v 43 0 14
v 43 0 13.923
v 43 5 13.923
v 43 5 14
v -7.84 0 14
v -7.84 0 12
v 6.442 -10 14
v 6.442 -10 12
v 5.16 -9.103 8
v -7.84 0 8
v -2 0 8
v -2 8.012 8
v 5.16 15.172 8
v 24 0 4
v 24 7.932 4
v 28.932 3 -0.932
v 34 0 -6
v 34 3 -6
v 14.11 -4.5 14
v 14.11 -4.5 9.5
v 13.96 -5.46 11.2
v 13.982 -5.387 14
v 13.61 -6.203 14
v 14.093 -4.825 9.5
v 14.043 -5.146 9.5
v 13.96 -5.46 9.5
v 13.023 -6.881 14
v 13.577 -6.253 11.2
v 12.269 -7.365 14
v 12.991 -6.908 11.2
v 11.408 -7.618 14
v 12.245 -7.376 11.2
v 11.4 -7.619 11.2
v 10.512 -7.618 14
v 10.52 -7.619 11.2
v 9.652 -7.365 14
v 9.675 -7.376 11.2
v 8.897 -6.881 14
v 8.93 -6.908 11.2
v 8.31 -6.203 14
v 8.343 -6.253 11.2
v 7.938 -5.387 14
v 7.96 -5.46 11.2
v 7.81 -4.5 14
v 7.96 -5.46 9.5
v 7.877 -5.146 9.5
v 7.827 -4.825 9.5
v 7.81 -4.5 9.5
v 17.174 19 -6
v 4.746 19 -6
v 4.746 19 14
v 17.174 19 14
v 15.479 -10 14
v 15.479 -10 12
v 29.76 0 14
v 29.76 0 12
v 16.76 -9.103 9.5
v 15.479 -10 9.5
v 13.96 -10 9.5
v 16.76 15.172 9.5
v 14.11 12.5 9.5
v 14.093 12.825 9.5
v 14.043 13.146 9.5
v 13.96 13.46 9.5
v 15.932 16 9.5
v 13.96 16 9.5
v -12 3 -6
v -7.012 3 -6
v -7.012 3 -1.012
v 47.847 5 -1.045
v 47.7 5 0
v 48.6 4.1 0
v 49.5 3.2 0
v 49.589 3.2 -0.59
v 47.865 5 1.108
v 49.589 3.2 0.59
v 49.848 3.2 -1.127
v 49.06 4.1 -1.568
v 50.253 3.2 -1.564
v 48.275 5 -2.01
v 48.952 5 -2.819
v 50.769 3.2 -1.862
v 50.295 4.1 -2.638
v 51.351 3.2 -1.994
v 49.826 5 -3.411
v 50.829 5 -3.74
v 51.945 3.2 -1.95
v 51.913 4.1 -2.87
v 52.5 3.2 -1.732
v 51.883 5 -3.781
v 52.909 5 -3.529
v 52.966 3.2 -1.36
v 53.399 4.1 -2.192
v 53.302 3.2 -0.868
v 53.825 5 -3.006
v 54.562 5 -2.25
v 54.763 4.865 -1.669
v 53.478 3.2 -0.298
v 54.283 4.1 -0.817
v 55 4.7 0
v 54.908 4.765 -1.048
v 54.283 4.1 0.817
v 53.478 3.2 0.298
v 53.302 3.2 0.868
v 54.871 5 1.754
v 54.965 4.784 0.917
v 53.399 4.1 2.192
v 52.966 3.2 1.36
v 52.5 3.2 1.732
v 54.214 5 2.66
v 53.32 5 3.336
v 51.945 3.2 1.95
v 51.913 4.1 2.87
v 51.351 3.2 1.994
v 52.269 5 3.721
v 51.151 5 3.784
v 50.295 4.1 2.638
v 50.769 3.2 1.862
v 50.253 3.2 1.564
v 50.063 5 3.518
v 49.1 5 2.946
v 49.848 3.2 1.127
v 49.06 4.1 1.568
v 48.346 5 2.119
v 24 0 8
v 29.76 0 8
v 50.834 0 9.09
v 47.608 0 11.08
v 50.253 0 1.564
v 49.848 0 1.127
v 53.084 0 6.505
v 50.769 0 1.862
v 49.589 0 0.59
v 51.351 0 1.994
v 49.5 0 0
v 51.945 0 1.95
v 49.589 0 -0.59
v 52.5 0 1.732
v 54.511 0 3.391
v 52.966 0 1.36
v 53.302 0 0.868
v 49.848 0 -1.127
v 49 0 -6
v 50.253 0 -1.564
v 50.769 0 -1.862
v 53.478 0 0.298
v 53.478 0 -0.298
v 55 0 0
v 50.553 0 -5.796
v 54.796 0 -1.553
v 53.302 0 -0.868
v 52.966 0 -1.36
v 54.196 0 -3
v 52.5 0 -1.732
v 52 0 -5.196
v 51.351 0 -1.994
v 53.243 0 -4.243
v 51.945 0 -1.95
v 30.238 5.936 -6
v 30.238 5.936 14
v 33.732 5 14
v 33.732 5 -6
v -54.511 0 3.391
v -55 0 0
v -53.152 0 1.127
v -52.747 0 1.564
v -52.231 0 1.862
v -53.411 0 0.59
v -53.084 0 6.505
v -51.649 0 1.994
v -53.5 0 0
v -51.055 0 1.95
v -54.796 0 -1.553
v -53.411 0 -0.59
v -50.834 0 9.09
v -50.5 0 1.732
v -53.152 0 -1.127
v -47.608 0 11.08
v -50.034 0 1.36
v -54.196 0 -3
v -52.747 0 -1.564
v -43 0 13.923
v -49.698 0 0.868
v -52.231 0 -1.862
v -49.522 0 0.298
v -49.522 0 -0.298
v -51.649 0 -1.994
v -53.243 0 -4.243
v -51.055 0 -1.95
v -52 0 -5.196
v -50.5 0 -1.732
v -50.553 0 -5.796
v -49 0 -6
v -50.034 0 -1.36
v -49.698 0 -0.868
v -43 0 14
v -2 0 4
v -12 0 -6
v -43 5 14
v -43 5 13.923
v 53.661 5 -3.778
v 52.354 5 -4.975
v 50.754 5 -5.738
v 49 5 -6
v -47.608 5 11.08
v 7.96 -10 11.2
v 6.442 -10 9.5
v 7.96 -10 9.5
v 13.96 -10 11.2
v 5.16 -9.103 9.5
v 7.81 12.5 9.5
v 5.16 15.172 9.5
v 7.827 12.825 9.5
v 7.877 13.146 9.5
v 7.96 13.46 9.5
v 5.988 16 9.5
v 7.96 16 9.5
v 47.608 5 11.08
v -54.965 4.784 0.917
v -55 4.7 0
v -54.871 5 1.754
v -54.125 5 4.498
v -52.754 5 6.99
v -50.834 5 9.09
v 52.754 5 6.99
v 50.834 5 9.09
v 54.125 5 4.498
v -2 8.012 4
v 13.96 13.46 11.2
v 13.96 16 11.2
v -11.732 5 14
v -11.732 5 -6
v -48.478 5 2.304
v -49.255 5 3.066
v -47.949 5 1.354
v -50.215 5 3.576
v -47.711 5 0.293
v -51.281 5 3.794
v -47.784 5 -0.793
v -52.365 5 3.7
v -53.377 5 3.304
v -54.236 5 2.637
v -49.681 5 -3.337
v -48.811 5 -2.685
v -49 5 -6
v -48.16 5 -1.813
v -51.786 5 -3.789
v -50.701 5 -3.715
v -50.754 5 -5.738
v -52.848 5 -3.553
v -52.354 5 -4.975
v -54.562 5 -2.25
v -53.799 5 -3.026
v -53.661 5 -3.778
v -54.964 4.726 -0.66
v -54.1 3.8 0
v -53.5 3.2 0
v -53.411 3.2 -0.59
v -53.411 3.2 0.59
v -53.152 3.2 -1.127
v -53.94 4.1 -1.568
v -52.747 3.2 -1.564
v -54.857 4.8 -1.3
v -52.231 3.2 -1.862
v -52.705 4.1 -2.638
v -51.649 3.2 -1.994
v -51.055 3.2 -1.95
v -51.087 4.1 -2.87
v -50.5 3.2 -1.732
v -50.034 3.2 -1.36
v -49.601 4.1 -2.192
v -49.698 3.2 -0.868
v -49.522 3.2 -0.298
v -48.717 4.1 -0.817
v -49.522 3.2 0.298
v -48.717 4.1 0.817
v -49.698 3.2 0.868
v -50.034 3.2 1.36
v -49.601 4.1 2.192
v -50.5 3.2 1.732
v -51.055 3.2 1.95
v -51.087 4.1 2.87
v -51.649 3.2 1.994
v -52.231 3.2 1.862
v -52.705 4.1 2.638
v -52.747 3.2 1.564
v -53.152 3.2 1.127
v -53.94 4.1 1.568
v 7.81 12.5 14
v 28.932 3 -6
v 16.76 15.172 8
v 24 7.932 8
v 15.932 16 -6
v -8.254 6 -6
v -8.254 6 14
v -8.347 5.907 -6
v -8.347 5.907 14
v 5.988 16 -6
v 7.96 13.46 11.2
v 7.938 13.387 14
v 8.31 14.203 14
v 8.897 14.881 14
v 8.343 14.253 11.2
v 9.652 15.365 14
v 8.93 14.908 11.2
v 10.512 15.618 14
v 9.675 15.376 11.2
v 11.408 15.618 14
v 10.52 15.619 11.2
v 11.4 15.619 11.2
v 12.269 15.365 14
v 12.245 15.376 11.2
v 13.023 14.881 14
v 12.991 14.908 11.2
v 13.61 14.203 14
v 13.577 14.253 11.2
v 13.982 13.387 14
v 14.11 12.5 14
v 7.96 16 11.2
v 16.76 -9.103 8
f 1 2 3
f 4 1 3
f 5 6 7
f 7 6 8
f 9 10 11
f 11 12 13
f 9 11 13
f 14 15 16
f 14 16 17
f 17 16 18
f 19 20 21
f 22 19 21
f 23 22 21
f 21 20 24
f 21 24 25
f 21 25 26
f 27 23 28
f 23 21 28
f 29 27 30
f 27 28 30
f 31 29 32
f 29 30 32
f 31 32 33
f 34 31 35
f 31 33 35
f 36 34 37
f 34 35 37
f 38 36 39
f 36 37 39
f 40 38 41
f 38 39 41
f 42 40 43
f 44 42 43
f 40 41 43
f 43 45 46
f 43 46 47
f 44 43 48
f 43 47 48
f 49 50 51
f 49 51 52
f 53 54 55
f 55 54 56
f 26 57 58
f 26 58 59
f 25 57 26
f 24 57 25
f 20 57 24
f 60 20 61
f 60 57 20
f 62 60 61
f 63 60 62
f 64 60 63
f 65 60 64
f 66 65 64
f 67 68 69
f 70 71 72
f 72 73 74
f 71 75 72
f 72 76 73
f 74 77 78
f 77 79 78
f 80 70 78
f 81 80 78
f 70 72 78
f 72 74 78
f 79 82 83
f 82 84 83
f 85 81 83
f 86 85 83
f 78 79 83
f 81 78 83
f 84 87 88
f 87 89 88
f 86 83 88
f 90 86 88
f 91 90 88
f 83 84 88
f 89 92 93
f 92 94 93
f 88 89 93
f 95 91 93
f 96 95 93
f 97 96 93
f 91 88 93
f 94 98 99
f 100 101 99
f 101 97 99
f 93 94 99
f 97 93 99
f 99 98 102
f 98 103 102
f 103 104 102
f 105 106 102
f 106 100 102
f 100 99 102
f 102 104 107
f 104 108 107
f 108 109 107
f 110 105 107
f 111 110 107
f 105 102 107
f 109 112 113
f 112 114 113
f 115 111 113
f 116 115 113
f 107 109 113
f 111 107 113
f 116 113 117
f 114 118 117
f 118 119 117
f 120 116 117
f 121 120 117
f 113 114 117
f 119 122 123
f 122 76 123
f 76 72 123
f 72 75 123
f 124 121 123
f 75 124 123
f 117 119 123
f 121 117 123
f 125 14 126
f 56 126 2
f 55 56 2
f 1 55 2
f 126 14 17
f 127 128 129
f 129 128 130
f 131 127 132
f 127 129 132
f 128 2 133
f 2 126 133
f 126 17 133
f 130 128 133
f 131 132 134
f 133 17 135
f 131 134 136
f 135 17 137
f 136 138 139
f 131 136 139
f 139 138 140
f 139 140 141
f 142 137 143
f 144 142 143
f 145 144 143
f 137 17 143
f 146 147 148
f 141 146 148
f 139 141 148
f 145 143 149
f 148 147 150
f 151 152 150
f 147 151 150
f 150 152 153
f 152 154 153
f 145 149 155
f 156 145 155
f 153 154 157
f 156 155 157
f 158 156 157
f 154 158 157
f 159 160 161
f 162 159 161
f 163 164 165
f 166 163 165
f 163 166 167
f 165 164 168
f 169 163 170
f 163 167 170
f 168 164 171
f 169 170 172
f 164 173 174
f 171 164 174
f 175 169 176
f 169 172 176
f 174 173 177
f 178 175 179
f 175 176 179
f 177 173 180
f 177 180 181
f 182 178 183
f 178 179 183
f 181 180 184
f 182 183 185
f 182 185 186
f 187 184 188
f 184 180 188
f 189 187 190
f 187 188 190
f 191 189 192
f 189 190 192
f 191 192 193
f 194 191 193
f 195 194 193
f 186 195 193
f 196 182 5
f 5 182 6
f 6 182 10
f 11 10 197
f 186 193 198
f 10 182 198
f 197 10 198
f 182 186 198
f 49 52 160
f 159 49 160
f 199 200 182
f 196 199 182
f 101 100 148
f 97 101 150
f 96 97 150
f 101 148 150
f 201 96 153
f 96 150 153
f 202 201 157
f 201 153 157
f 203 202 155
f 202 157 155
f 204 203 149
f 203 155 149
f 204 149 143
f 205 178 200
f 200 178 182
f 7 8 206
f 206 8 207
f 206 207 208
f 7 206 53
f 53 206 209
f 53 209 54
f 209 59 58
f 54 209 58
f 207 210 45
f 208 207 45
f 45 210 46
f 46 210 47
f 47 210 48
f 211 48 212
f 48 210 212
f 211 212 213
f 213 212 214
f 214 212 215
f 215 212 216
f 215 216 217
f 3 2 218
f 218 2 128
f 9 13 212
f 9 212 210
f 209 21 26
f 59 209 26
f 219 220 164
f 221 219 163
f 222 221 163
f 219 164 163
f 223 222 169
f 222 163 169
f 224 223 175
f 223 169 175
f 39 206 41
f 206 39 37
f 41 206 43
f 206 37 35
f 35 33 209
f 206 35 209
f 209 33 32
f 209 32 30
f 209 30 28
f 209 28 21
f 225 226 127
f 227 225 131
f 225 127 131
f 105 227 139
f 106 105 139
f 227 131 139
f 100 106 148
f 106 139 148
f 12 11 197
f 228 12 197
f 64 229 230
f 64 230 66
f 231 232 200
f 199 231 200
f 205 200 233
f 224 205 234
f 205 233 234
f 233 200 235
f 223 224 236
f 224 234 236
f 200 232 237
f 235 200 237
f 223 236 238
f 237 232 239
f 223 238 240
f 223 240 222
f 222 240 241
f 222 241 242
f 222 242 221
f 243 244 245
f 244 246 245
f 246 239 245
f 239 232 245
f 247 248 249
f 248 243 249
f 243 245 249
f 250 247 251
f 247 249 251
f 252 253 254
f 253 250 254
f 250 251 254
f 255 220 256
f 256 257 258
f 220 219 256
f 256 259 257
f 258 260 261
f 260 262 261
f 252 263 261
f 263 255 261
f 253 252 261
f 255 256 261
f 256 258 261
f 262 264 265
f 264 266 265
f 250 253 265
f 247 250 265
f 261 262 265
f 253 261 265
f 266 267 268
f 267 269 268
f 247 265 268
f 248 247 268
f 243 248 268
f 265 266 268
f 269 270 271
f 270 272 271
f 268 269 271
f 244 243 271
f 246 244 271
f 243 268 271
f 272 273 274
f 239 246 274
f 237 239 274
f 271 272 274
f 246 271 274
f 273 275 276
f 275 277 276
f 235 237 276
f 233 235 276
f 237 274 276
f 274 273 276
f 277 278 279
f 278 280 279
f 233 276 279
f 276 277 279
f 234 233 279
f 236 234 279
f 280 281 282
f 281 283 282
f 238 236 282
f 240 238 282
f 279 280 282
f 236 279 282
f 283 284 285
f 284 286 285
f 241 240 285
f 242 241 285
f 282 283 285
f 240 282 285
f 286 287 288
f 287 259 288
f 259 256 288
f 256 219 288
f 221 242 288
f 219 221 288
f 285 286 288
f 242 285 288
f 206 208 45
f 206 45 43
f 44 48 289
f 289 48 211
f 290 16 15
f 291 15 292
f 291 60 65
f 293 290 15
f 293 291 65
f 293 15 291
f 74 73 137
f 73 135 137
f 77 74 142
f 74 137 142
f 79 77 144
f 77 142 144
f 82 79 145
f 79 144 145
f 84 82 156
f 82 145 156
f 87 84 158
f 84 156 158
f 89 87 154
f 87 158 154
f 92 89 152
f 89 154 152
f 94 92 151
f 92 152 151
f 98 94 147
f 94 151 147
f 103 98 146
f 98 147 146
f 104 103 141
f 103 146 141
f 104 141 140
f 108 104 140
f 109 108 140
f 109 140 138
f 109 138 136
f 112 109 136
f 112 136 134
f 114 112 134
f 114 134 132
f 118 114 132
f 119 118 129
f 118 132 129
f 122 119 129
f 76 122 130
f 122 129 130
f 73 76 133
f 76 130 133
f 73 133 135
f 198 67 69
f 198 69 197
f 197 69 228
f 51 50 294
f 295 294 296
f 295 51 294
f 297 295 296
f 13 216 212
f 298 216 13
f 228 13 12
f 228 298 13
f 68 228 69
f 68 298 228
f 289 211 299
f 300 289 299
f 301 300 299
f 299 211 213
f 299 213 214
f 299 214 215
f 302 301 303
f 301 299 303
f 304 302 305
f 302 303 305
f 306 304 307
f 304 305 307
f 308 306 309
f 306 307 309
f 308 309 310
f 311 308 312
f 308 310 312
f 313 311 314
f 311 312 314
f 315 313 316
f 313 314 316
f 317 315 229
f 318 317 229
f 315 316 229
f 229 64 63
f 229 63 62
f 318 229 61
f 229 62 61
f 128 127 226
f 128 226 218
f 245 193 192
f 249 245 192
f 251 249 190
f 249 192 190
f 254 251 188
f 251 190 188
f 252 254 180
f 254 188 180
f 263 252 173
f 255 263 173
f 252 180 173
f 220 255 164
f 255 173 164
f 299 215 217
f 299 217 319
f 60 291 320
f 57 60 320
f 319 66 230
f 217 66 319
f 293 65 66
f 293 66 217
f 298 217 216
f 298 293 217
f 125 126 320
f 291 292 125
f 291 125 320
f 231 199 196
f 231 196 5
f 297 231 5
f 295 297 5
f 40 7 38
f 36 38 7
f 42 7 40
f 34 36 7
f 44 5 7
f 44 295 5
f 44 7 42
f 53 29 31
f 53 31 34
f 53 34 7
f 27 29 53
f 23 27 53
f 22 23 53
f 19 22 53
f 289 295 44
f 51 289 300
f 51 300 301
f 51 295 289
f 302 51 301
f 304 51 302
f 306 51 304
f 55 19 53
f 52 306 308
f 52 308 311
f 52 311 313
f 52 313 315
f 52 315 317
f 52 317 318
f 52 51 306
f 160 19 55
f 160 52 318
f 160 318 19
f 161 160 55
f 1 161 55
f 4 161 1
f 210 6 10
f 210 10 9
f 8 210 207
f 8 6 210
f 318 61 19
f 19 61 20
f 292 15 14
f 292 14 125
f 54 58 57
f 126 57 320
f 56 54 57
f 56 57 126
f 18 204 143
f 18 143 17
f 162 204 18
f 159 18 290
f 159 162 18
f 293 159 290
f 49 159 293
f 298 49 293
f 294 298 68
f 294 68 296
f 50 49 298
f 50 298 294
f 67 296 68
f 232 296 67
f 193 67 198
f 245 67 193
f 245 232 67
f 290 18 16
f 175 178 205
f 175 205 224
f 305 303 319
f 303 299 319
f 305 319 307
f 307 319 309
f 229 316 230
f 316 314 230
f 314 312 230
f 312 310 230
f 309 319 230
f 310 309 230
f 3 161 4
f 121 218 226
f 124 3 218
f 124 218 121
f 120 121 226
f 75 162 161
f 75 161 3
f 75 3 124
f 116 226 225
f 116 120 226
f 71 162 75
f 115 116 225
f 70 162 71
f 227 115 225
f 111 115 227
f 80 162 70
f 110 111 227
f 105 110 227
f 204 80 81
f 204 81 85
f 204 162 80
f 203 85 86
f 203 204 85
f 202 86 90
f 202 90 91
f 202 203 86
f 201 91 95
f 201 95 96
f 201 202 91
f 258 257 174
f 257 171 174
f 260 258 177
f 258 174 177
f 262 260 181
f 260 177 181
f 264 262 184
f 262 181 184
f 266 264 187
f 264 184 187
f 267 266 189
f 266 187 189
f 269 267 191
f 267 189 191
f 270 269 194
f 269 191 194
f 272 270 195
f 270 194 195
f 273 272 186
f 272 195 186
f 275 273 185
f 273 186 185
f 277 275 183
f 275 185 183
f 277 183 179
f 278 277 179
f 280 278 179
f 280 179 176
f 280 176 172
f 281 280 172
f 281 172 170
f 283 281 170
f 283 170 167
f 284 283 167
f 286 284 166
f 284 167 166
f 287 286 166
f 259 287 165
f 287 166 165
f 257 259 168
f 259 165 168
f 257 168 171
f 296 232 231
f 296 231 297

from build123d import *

# Parameters (mm, degrees)
BOSS_EXTRUDE1_DEPTH           = 3
CUT_EXTRUDE1_DEPTH            = 10
CUT_EXTRUDE3_START            = 8
SKETCH8_W                     = 6
SKETCH8_H                     = 3
CUT_EXTRUDE3_DEPTH            = 6
BOSS_EXTRUDE4_START           = 18
BOSS_EXTRUDE4_DEPTH           = 28
BOSS_EXTRUDE5_DEPTH           = 3
CUT_EXTRUDE4_DEPTH            = 3
CUT_EXTRUDE5_DEPTH            = 10
SKETCH18_R                    = 1.5
BOSS_EXTRUDE9_DEPTH           = 2
CHAMFER1_SIZE                 = 15
CHAMFER2_SIZE                 = 15
CHAMFER2_SIZE_2               = 10.503113073
CUT_EXTRUDE6_DEPTH            = 5
BOSS_EXTRUDE8_DEPTH           = 2
CHAMFER3_DEPTH                = 6
CHAMFER3_2_DEPTH              = 5
CSK_FOR_M4_SFHCS1_D           = 4
CSK_FOR_M4_SFHCS1_DEPTH       = 30.798278762
CSK_FOR_M4_SFHCS1_CSINK_D     = 7.6
CSK_FOR_M4_SFHCS1_CSINK_ANGLE = 90
CSK_FOR_M4_SFHCS1_TIP         = 1.201721238
CUT_EXTRUDE7_DEPTH            = 1.5
BOSS_EXTRUDE10_START          = -6
BOSS_EXTRUDE10_DEPTH          = 20
CHAMFER4_SIZE                 = 1.07179677
CHAMFER4_SIZE_2               = 4


with BuildPart() as part:
    # Sketch1 → Boss-Extrude1 (new body)
    with BuildSketch(Plane(origin=(0, 0, 0), x_dir=(1, 0, 0), z_dir=(0, 1, 0))):
        with BuildLine():
            ThreePointArc((-49, -6), (-53.242640687, -4.242640687), (-55, 0))
            ThreePointArc((-55, 0), (-51.485281374, -8.485281374), (-43, -12))
            Line((-43, -12), (43, -12))
            ThreePointArc((43, -12), (51.485281374, -8.485281374), (55, 0))
            ThreePointArc((55, 0), (53.242640687, -4.242640687), (49, -6))
            Line((49, -6), (-49, -6))
        make_face()
        with BuildLine():
            Line((-53, 0), (-55, 0))
            ThreePointArc((-55, 0), (-53.242640687, -4.242640687), (-49, -6))
            Line((-49, -6), (49, -6))
            ThreePointArc((49, -6), (53.242640687, -4.242640687), (55, 0))
            Line((55, 0), (53, 0))
            ThreePointArc((53, 0), (51.5, -1.5), (50, 0))
            Line((50, 0), (-50, 0))
            ThreePointArc((-50, 0), (-51.5, -1.5), (-53, 0))
        make_face()
        with BuildLine():
            Line((49, 6), (-49, 6))
            ThreePointArc((-49, 6), (-53.242640687, 4.242640687), (-55, 0))
            Line((-55, 0), (-53, 0))
            ThreePointArc((-53, 0), (-51.5, 1.5), (-50, 0))
            Line((-50, 0), (50, 0))
            ThreePointArc((50, 0), (51.5, 1.5), (53, 0))
            Line((53, 0), (55, 0))
            ThreePointArc((55, 0), (53.242640687, 4.242640687), (49, 6))
        make_face()
    extrude(amount=BOSS_EXTRUDE1_DEPTH)

    # Sketch2 → Cut-Extrude1 (cut)
    with BuildSketch(Plane(origin=(0, 3, 0), x_dir=(1, 0, 0), z_dir=(0, 1, 0))):
        Polygon((22, -8), (36, 6), (-14, 6), (0, -8), align=None)
    extrude(amount=-CUT_EXTRUDE1_DEPTH, mode=Mode.SUBTRACT)

    # Sketch8 → Cut-Extrude3 (cut)
    with BuildSketch(Plane.XY.offset(CUT_EXTRUDE3_START)):
        with Locations((10.960071178, 1.5)):
            Rectangle(SKETCH8_W, SKETCH8_H)
    extrude(amount=CUT_EXTRUDE3_DEPTH, mode=Mode.SUBTRACT)


with BuildPart() as cut_extrude3_piece_1:
    # of the separate pieces the step leaves, piece 1, a body of its own (cut_extrude3_pieces)
    add(part.part.solids().sort_by_distance((-55, 0, 0))[0])

    # Sketch9 → Boss-Extrude4 (add)
    with BuildSketch(Plane(origin=(0, 0, 0), x_dir=(1, 0, 0), z_dir=(0, 1, 0)).offset(BOSS_EXTRUDE4_START)):
        Polygon((13.960071178, -11.2), (13.960071178, -8), (14.760071178, -8), (14.760071178, -12), (7.160071178, -12), (7.160071178, -8), (7.960071178, -8), (7.960071178, -11.2), align=None)
    extrude(amount=-BOSS_EXTRUDE4_DEPTH)


with BuildPart() as cut_extrude3_piece_2:
    # of the separate pieces the step leaves, piece 2, a body of its own (cut_extrude3_pieces)
    add(part.part.solids().sort_by_distance((13.960071178, 0, 12))[0])


with BuildPart() as cut_extrude3_piece_1_1:
    add(cut_extrude3_piece_1.part)

    # Combine1: union Cut-Extrude3 piece 2
    add(cut_extrude3_piece_2.part)

    # Sketch11 → Boss-Extrude5 (add)
    with BuildSketch(Plane(origin=(0, 3, 0), x_dir=(1, 0, 0), z_dir=(0, 1, 0))):
        Polygon((-14, 6), (-12, 6), (2, -8), (0, -8), align=None)
        Polygon((20, -8), (34, 6), (36, 6), (22, -8), align=None)
    extrude(amount=-BOSS_EXTRUDE5_DEPTH)

    # Sketch13 → Cut-Extrude4 (cut)
    with BuildSketch(Plane(origin=(0, 3, 0), x_dir=(1, 0, 0), z_dir=(0, 1, 0))):
        Polygon((2, -8), (-2, -8), (-2, -4), align=None)
        Polygon((24, -4), (24, -8), (20, -8), align=None)
    extrude(amount=-CUT_EXTRUDE4_DEPTH, mode=Mode.SUBTRACT)

    # Sketch15 → Cut-Extrude5 (cut)
    with BuildSketch(Plane.XY.offset(12)):
        with BuildLine():
            Line((14.110071178, 12.5), (14.110071178, -4.5))
            ThreePointArc((14.110071178, -4.5), (10.960071178, -7.65), (7.810071178, -4.5))
            Line((7.810071178, -4.5), (7.810071178, 12.5))
            ThreePointArc((7.810071178, 12.5), (10.960071178, 15.65), (14.110071178, 12.5))
        make_face()
    extrude(amount=-CUT_EXTRUDE5_DEPTH, mode=Mode.SUBTRACT)

    # Sketch18 → Boss-Extrude9 (add)
    # profile 1 of 2: a face of its own
    with BuildSketch(Plane(origin=(0, 3, 0), x_dir=(1, 0, 0), z_dir=(0, 1, 0))):
        with BuildLine():
            Line((7.160071178, -8), (-2, -8))
            Line((-2, -8), (-2, -4))
            Line((-2, -4), (-12, 6))
            Line((-12, 6), (-49, 6))
            ThreePointArc((-49, 6), (-53.242640687, 4.242640687), (-55, 0))
            ThreePointArc((-55, 0), (-51.485281374, -8.485281374), (-43, -12))
            Line((-43, -12), (7.160071178, -12))
            Line((7.160071178, -12), (7.160071178, -8))
        make_face()
        with Locations(Location((-51.5, 0, 0), (0, 0, 270))):
            Circle(SKETCH18_R, mode=Mode.SUBTRACT)
    # profile 2 of 2: a face of its own
    with BuildSketch(Plane(origin=(0, 3, 0), x_dir=(1, 0, 0), z_dir=(0, 1, 0))):
        with BuildLine():
            Line((24, -4), (24, -8))
            Line((24, -8), (14.760071178, -8))
            Line((14.760071178, -8), (14.760071178, -12))
            Line((14.760071178, -12), (43, -12))
            ThreePointArc((43, -12), (51.485281374, -8.485281374), (55, 0))
            ThreePointArc((55, 0), (53.242640687, 4.242640687), (49, 6))
            Line((49, 6), (34, 6))
            Line((34, 6), (24, -4))
        make_face()
        with Locations(Location((51.5, 0, 0), (0, 0, 270))):
            Circle(SKETCH18_R, mode=Mode.SUBTRACT)
    extrude(amount=BOSS_EXTRUDE9_DEPTH)

    # Chamfer1
    # the kernel refuses this chamfer: 15 mm, written as the material it adds along each edge
    with BuildSketch(Plane(origin=(14.760071178, 5, 8), x_dir=(0, 1, 0), z_dir=(0, 0, 1))) as chamfer1_piece_1_section:
        Polygon((CHAMFER1_SIZE, 0), (0, -CHAMFER1_SIZE), (0, 0), align=None)
    chamfer1_piece_1 = extrude(amount=4, mode=Mode.PRIVATE)
    chamfer1_piece_1 = split(chamfer1_piece_1, bisect_by=Plane(origin=(14.760071178, 18, 8), z_dir=(0, -1, 0)), keep=Keep.TOP, mode=Mode.PRIVATE)
    chamfer1_piece_1 = split(chamfer1_piece_1, bisect_by=Plane(origin=(17.380035589, 5, 10.619964411), z_dir=(-0.7071067811865474, 0, -0.7071067811865477)), keep=Keep.TOP, mode=Mode.PRIVATE)
    add(chamfer1_piece_1)
    with BuildSketch(Plane(origin=(14.760071178, 5, -30.575244819), x_dir=(0, 1, 0), z_dir=(0, 0, 1))) as chamfer1_piece_2_section:
        Polygon((CHAMFER1_SIZE, 0), (0, -CHAMFER1_SIZE), (0, 0), align=None)
    chamfer1_piece_2 = extrude(amount=42.575244819, mode=Mode.PRIVATE)
    chamfer1_piece_2 = split(chamfer1_piece_2, bisect_by=Plane(origin=(14.760071178, 5, 8), z_dir=(0, 0, -1)), keep=Keep.TOP, mode=Mode.PRIVATE)
    chamfer1_piece_2 = split(chamfer1_piece_2, bisect_by=Plane(origin=(36.667657999, 5, -8.667657999), z_dir=(0.7071067811865474, 0, 0.7071067811865477)), keep=Keep.TOP, mode=Mode.PRIVATE)
    chamfer1_piece_2 = split(chamfer1_piece_2, bisect_by=Plane(origin=(24, 5, -30.575244819), z_dir=(1, 0, 0)), keep=Keep.TOP, mode=Mode.PRIVATE)
    add(chamfer1_piece_2)
    with BuildSketch(Plane(origin=(14.760071178, 5, 8), x_dir=(0, 1, 0), z_dir=(0, 0, 1))) as chamfer1_piece_3_section:
        Polygon((CHAMFER1_SIZE, 0), (0, -CHAMFER1_SIZE), (0, 0), align=None)
    chamfer1_piece_3 = extrude(amount=4, mode=Mode.PRIVATE)
    chamfer1_piece_3 = split(chamfer1_piece_3, bisect_by=Plane(origin=(14.760071178, 18, 8), z_dir=(0, -1, 0)), keep=Keep.TOP, mode=Mode.PRIVATE)
    chamfer1_piece_3 = split(chamfer1_piece_3, bisect_by=Plane(origin=(17.380035589, 5, 10.619964411), z_dir=(0.7071067811865474, 0, 0.7071067811865477)), keep=Keep.TOP, mode=Mode.PRIVATE)
    chamfer1_piece_3 = split(chamfer1_piece_3, bisect_by=Plane(origin=(24, 5, 8), z_dir=(-1, 0, 0)), keep=Keep.TOP, mode=Mode.PRIVATE)
    add(chamfer1_piece_3)
    with BuildSketch(Plane(origin=(14.760071178, 5, 8), x_dir=(0, 1, 0), z_dir=(0, 0, 1))) as chamfer1_piece_4_section:
        Polygon((CHAMFER1_SIZE, 0), (0, -CHAMFER1_SIZE), (0, 0), align=None)
    chamfer1_piece_4 = extrude(amount=4, mode=Mode.PRIVATE)
    chamfer1_piece_4 = split(chamfer1_piece_4, bisect_by=Plane(origin=(24, 5, 8), z_dir=(1, 0, 0)), keep=Keep.TOP, mode=Mode.PRIVATE)
    add(chamfer1_piece_4)
    with BuildSketch(Plane(origin=(7.160071178, 5, 12), x_dir=(0, 1, 0), z_dir=(0, 0, -1))) as chamfer1_piece_5_section:
        Polygon((CHAMFER1_SIZE, 0), (0, -CHAMFER1_SIZE), (0, 0), align=None)
    chamfer1_piece_5 = extrude(amount=4, mode=Mode.PRIVATE)
    chamfer1_piece_5 = split(chamfer1_piece_5, bisect_by=Plane(origin=(6.580035589, 5, 12.580035589), z_dir=(-0.7071067811865489, 0, 0.7071067811865461)), keep=Keep.TOP, mode=Mode.PRIVATE)
    chamfer1_piece_5 = split(chamfer1_piece_5, bisect_by=Plane(origin=(-2, 5, 12), z_dir=(1, 0, 0)), keep=Keep.TOP, mode=Mode.PRIVATE)
    chamfer1_piece_5 = split(chamfer1_piece_5, bisect_by=Plane(origin=(7.160071178, 18, 12), z_dir=(0, -1, 0)), keep=Keep.TOP, mode=Mode.PRIVATE)
    add(chamfer1_piece_5)
    with BuildSketch(Plane(origin=(7.160071178, 5, 12), x_dir=(0, 1, 0), z_dir=(0, 0, -1))) as chamfer1_piece_6_section:
        Polygon((CHAMFER1_SIZE, 0), (0, -CHAMFER1_SIZE), (0, 0), align=None)
    chamfer1_piece_6 = extrude(amount=4, mode=Mode.PRIVATE)
    chamfer1_piece_6 = split(chamfer1_piece_6, bisect_by=Plane(origin=(-2, 5, 12), z_dir=(-1, 0, 0)), keep=Keep.TOP, mode=Mode.PRIVATE)
    add(chamfer1_piece_6)
    with BuildSketch(Plane(origin=(7.160071178, 5, 12), x_dir=(0, 1, 0), z_dir=(0, 0, -1))) as chamfer1_piece_7_section:
        Polygon((CHAMFER1_SIZE, 0), (0, -CHAMFER1_SIZE), (0, 0), align=None)
    chamfer1_piece_7 = extrude(amount=4, mode=Mode.PRIVATE)
    chamfer1_piece_7 = split(chamfer1_piece_7, bisect_by=Plane(origin=(6.580035589, 5, 12.580035589), z_dir=(0.7071067811865489, 0, -0.7071067811865461)), keep=Keep.TOP, mode=Mode.PRIVATE)
    chamfer1_piece_7 = split(chamfer1_piece_7, bisect_by=Plane(origin=(7.160071178, 18, 12), z_dir=(0, -1, 0)), keep=Keep.TOP, mode=Mode.PRIVATE)
    add(chamfer1_piece_7)
    with BuildSketch(Plane(origin=(7.160071178, 5, 12), x_dir=(0, 1, 0), z_dir=(0, 0, -1))) as chamfer1_piece_8_section:
        Polygon((CHAMFER1_SIZE, 0), (0, -CHAMFER1_SIZE), (0, 0), align=None)
    chamfer1_piece_8 = extrude(amount=42.575244819, mode=Mode.PRIVATE)
    chamfer1_piece_8 = split(chamfer1_piece_8, bisect_by=Plane(origin=(6.580035589, 5, 12.580035589), z_dir=(-0.7071067811865489, 0, 0.7071067811865461)), keep=Keep.TOP, mode=Mode.PRIVATE)
    chamfer1_piece_8 = split(chamfer1_piece_8, bisect_by=Plane(origin=(-2, 5, 12), z_dir=(-1, 0, 0)), keep=Keep.TOP, mode=Mode.PRIVATE)
    chamfer1_piece_8 = split(chamfer1_piece_8, bisect_by=Plane(origin=(7.160071178, 5, 8), z_dir=(0, 0, -1)), keep=Keep.TOP, mode=Mode.PRIVATE)
    add(chamfer1_piece_8)

    # Chamfer2
    # the kernel refuses this chamfer: 15, 10.503113073 mm, written as the material it adds along each edge
    with BuildSketch(Plane(origin=(7.160071178, 0, 12), x_dir=(-1, 0, 0), z_dir=(0, 0, -1))) as chamfer2_piece_1_section:
        Polygon((CHAMFER2_SIZE, 0), (0, -CHAMFER2_SIZE_2), (0, 0), align=None)
    chamfer2_piece_1 = extrude(amount=4, mode=Mode.PRIVATE)
    chamfer2_piece_1 = split(chamfer2_piece_1, bisect_by=Plane(origin=(-2, 0, 12), z_dir=(-1, 0, 0)), keep=Keep.TOP, mode=Mode.PRIVATE)
    add(chamfer2_piece_1)
    with BuildSketch(Plane(origin=(7.160071178, 0, 12), x_dir=(-1, 0, 0), z_dir=(0, 0, -1))) as chamfer2_piece_2_section:
        Polygon((CHAMFER2_SIZE, 0), (0, -CHAMFER2_SIZE_2), (0, 0), align=None)
    chamfer2_piece_2 = extrude(amount=4, mode=Mode.PRIVATE)
    chamfer2_piece_2 = split(chamfer2_piece_2, bisect_by=Plane(origin=(6.580035589, 0, 12.580035589), z_dir=(-0.7071067811865476, 0, 0.7071067811865476)), keep=Keep.TOP, mode=Mode.PRIVATE)
    chamfer2_piece_2 = split(chamfer2_piece_2, bisect_by=Plane(origin=(-2, 0, 12), z_dir=(1, 0, 0)), keep=Keep.TOP, mode=Mode.PRIVATE)
    add(chamfer2_piece_2)
    with BuildSketch(Plane(origin=(7.160071178, 0, 12), x_dir=(-1, 0, 0), z_dir=(0, 0, -1))) as chamfer2_piece_3_section:
        Polygon((CHAMFER2_SIZE, 0), (0, -CHAMFER2_SIZE_2), (0, 0), align=None)
    chamfer2_piece_3 = extrude(amount=42.738283454, mode=Mode.PRIVATE)
    chamfer2_piece_3 = split(chamfer2_piece_3, bisect_by=Plane(origin=(6.580035589, 0, 12.580035589), z_dir=(-0.7071067811865476, 0, 0.7071067811865476)), keep=Keep.TOP, mode=Mode.PRIVATE)
    chamfer2_piece_3 = split(chamfer2_piece_3, bisect_by=Plane(origin=(7.160071178, 0, 8), z_dir=(0, 0, -1)), keep=Keep.TOP, mode=Mode.PRIVATE)
    chamfer2_piece_3 = split(chamfer2_piece_3, bisect_by=Plane(origin=(-2, 0, 12), z_dir=(-1, 0, 0)), keep=Keep.TOP, mode=Mode.PRIVATE)
    add(chamfer2_piece_3)
    with BuildSketch(Plane(origin=(7.160071178, 0, 12), x_dir=(-1, 0, 0), z_dir=(0, 0, -1))) as chamfer2_piece_4_section:
        Polygon((CHAMFER2_SIZE, 0), (0, -CHAMFER2_SIZE_2), (0, 0), align=None)
    chamfer2_piece_4 = extrude(amount=4, mode=Mode.PRIVATE)
    chamfer2_piece_4 = split(chamfer2_piece_4, bisect_by=Plane(origin=(6.580035589, 0, 12.580035589), z_dir=(0.7071067811865476, 0, -0.7071067811865476)), keep=Keep.TOP, mode=Mode.PRIVATE)
    chamfer2_piece_4 = split(chamfer2_piece_4, bisect_by=Plane(origin=(7.160071178, -10, 12), z_dir=(0, 1, 0)), keep=Keep.TOP, mode=Mode.PRIVATE)
    add(chamfer2_piece_4)
    with BuildSketch(Plane(origin=(14.760071178, 0, 12), x_dir=(0, -1, 0), z_dir=(0, 0, -1))) as chamfer2_piece_5_section:
        Polygon((CHAMFER2_SIZE_2, 0), (0, -CHAMFER2_SIZE), (0, 0), align=None)
    chamfer2_piece_5 = extrude(amount=4, mode=Mode.PRIVATE)
    chamfer2_piece_5 = split(chamfer2_piece_5, bisect_by=Plane(origin=(15.380035589, 0, 12.619964411), z_dir=(0.7071067811865476, 0, 0.7071067811865476)), keep=Keep.TOP, mode=Mode.PRIVATE)
    chamfer2_piece_5 = split(chamfer2_piece_5, bisect_by=Plane(origin=(24, 0, 12), z_dir=(-1, 0, 0)), keep=Keep.TOP, mode=Mode.PRIVATE)
    add(chamfer2_piece_5)
    with BuildSketch(Plane(origin=(14.760071178, 0, 12), x_dir=(0, -1, 0), z_dir=(0, 0, -1))) as chamfer2_piece_6_section:
        Polygon((CHAMFER2_SIZE_2, 0), (0, -CHAMFER2_SIZE), (0, 0), align=None)
    chamfer2_piece_6 = extrude(amount=4, mode=Mode.PRIVATE)
    chamfer2_piece_6 = split(chamfer2_piece_6, bisect_by=Plane(origin=(24, 0, 12), z_dir=(1, 0, 0)), keep=Keep.TOP, mode=Mode.PRIVATE)
    add(chamfer2_piece_6)
    with BuildSketch(Plane(origin=(14.760071178, 0, 12), x_dir=(0, -1, 0), z_dir=(0, 0, -1))) as chamfer2_piece_7_section:
        Polygon((CHAMFER2_SIZE_2, 0), (0, -CHAMFER2_SIZE), (0, 0), align=None)
    chamfer2_piece_7 = extrude(amount=4, mode=Mode.PRIVATE)
    chamfer2_piece_7 = split(chamfer2_piece_7, bisect_by=Plane(origin=(14.760071178, -10, 12), z_dir=(0, 1, 0)), keep=Keep.TOP, mode=Mode.PRIVATE)
    chamfer2_piece_7 = split(chamfer2_piece_7, bisect_by=Plane(origin=(15.380035589, 0, 12.619964411), z_dir=(-0.7071067811865476, 0, -0.7071067811865476)), keep=Keep.TOP, mode=Mode.PRIVATE)
    add(chamfer2_piece_7)
    with BuildSketch(Plane(origin=(14.760071178, 0, 12), x_dir=(0, -1, 0), z_dir=(0, 0, -1))) as chamfer2_piece_8_section:
        Polygon((CHAMFER2_SIZE_2, 0), (0, -CHAMFER2_SIZE), (0, 0), align=None)
    chamfer2_piece_8 = extrude(amount=42.738283454, mode=Mode.PRIVATE)
    chamfer2_piece_8 = split(chamfer2_piece_8, bisect_by=Plane(origin=(14.760071178, 0, 8), z_dir=(0, 0, -1)), keep=Keep.TOP, mode=Mode.PRIVATE)
    chamfer2_piece_8 = split(chamfer2_piece_8, bisect_by=Plane(origin=(15.380035589, 0, 12.619964411), z_dir=(0.7071067811865476, 0, 0.7071067811865476)), keep=Keep.TOP, mode=Mode.PRIVATE)
    chamfer2_piece_8 = split(chamfer2_piece_8, bisect_by=Plane(origin=(24, 0, 12), z_dir=(1, 0, 0)), keep=Keep.TOP, mode=Mode.PRIVATE)
    add(chamfer2_piece_8)

    # Sketch16 → Cut-Extrude6 (cut)
    with BuildSketch(Plane(origin=(0, 0, 0), x_dir=(1, 0, 0), z_dir=(0, 1, 0))):
        Polygon((-7.839928822, 1.839928822), (-2, -4), (-2, -8), (-7.839928822, -8), align=None)
        Polygon((24, -8), (24, -4), (29.760071178, 1.760071178), (29.760071178, -8), align=None)
    extrude(amount=-CUT_EXTRUDE6_DEPTH, mode=Mode.SUBTRACT)

    # Sketch17 → Boss-Extrude8 (add)
    with BuildSketch(Plane.XY.offset(12)):
        Polygon((-7.839928822, 0), (6.441551245, -10), (15.47859111, -10), (29.760071178, 0), (43, 0), (43, 5), (29.760071178, 5), (16.760071178, 18), (5.160071178, 18), (-7.839928822, 5), (-43, 5), (-43, 0), align=None)
        with BuildLine():
            Line((7.810071178, -4.5), (7.810071178, 12.5))
            ThreePointArc((7.810071178, 12.5), (10.960071178, 15.65), (14.110071178, 12.5))
            Line((14.110071178, 12.5), (14.110071178, -4.5))
            ThreePointArc((14.110071178, -4.5), (10.960071178, -7.65), (7.810071178, -4.5))
        make_face(mode=Mode.SUBTRACT)
    extrude(amount=BOSS_EXTRUDE8_DEPTH)

    # Chamfer3: read off the stored shape, not the designer's step
    # Chamfer3 outline → Chamfer3 (cut)
    with BuildSketch(Plane(origin=(0, 0, 0), x_dir=(1, 0, 0), z_dir=(0, 1, 0))):
        with BuildLine():
            ThreePointArc((47.608318931, -11.079864468), (49.300429772, -10.212961602), (50.834384089, -9.08968789))
            Line((50.834384089, -9.08968789), (47.608318931, -11.079864468))
        make_face()
        with BuildLine():
            ThreePointArc((-50.834384089, -9.08968789), (-49.300429772, -10.212961602), (-47.608318931, -11.079864468))
            Line((-47.608318931, -11.079864468), (-50.834384089, -9.08968789))
        make_face()
    extrude(amount=CHAMFER3_DEPTH, mode=Mode.SUBTRACT)

    # Chamfer3 2 outline → Chamfer3 2 (add)
    with BuildSketch(Plane(origin=(0, 0, 0), x_dir=(1, 0, 0), z_dir=(0, 1, 0))):
        with BuildLine():
            Line((43, -13.922760673), (47.608318931, -11.079864468))
            ThreePointArc((47.608318931, -11.079864468), (45.349641077, -11.767717995), (43, -12))
            Line((43, -12), (43, -13.922760673))
        make_face()
        with BuildLine():
            Line((-47.608318931, -11.079864468), (-43, -13.922760673))
            Line((-43, -13.922760673), (-43, -12))
            ThreePointArc((-43, -12), (-45.349641077, -11.767717995), (-47.608318931, -11.079864468))
        make_face()
    extrude(amount=CHAMFER3_2_DEPTH)

    # CSK for M4 SFHCS1
    with Locations(Plane(origin=(0, 5, 0), x_dir=(1, 0, 0), z_dir=(0, 1, 0))):
        with Locations((-51.5, 0), (51.5, 0)):
            CounterSinkHole(CSK_FOR_M4_SFHCS1_D / 2, CSK_FOR_M4_SFHCS1_CSINK_D / 2, depth=CSK_FOR_M4_SFHCS1_DEPTH, counter_sink_angle=CSK_FOR_M4_SFHCS1_CSINK_ANGLE)
            with Locations((0, 0, -(CSK_FOR_M4_SFHCS1_DEPTH + CSK_FOR_M4_SFHCS1_TIP / 2))):  # 118° drill point
                Cone(0, CSK_FOR_M4_SFHCS1_D / 2, CSK_FOR_M4_SFHCS1_TIP, mode=Mode.SUBTRACT)

    # Sketch21 → Cut-Extrude7 (cut)
    with BuildSketch(Plane(origin=(0, 0, 8), x_dir=(-1, 0, 0), z_dir=(0, 0, -1))):
        Polygon((-13.960071178, -10), (-13.960071178, 18), (-16.760071178, 18), (-16.760071178, -9.102697997), (-15.47859111, -10), align=None)
        Polygon((-7.960071178, -10), (-7.960071178, 18), (-5.160071178, 18), (-5.160071178, -9.102697997), (-6.441551245, -10), align=None)
    extrude(amount=-CUT_EXTRUDE7_DEPTH, mode=Mode.SUBTRACT)

    # Sketch22 → Boss-Extrude10 (add)
    with BuildSketch(Plane.XY.offset(BOSS_EXTRUDE10_START)):
        Polygon((34, 3), (28.931644053, 3), (15.931644053, 16), (5.988498302, 16), (-7.011501698, 3), (-12, 3), (-12, 6), (-8.254142385, 6), (4.745857615, 19), (17.17428474, 19), (30.17428474, 6), (34, 6), align=None)
    extrude(amount=BOSS_EXTRUDE10_DEPTH)

    # Chamfer4
    # the kernel refuses this chamfer: 4, 1.07179677 mm, written as the material it takes off along each edge
    with BuildSketch(Plane(origin=(-12, 6, -16.386886281), x_dir=(0, -1, 0), z_dir=(0, 0, 1))) as chamfer4_piece_1_section:
        Polygon((CHAMFER4_SIZE, 0), (0, CHAMFER4_SIZE_2), (0, 0), align=None)
    chamfer4_piece_1 = extrude(amount=40.773772562, mode=Mode.PRIVATE)
    chamfer4_piece_1 = split(chamfer4_piece_1, bisect_by=Plane(origin=(-12, 5, -16.386886281), z_dir=(0, 1, 0)), keep=Keep.TOP, mode=Mode.PRIVATE)
    chamfer4_piece_1 = split(chamfer4_piece_1, bisect_by=Plane(origin=(-10.127071192, 4.127071192, -16.386886281), z_dir=(-0.707106781186548, 0.7071067811865472, 0)), keep=Keep.TOP, mode=Mode.PRIVATE)
    add(chamfer4_piece_1, mode=Mode.SUBTRACT)
    with BuildSketch(Plane(origin=(34, 6, -16.386886281), x_dir=(-1, 0, 0), z_dir=(0, 0, 1))) as chamfer4_piece_2_section:
        Polygon((CHAMFER4_SIZE_2, 0), (0, CHAMFER4_SIZE), (0, 0), align=None)
    chamfer4_piece_2 = extrude(amount=40.773772562, mode=Mode.PRIVATE)
    chamfer4_piece_2 = split(chamfer4_piece_2, bisect_by=Plane(origin=(34, 5, -16.386886281), z_dir=(0, 1, 0)), keep=Keep.TOP, mode=Mode.PRIVATE)
    chamfer4_piece_2 = split(chamfer4_piece_2, bisect_by=Plane(origin=(32.08714237, 4.08714237, -16.386886281), z_dir=(0.7071067811865475, 0.7071067811865476, 0)), keep=Keep.TOP, mode=Mode.PRIVATE)
    add(chamfer4_piece_2, mode=Mode.SUBTRACT)


solid = cut_extrude3_piece_1_1.part
